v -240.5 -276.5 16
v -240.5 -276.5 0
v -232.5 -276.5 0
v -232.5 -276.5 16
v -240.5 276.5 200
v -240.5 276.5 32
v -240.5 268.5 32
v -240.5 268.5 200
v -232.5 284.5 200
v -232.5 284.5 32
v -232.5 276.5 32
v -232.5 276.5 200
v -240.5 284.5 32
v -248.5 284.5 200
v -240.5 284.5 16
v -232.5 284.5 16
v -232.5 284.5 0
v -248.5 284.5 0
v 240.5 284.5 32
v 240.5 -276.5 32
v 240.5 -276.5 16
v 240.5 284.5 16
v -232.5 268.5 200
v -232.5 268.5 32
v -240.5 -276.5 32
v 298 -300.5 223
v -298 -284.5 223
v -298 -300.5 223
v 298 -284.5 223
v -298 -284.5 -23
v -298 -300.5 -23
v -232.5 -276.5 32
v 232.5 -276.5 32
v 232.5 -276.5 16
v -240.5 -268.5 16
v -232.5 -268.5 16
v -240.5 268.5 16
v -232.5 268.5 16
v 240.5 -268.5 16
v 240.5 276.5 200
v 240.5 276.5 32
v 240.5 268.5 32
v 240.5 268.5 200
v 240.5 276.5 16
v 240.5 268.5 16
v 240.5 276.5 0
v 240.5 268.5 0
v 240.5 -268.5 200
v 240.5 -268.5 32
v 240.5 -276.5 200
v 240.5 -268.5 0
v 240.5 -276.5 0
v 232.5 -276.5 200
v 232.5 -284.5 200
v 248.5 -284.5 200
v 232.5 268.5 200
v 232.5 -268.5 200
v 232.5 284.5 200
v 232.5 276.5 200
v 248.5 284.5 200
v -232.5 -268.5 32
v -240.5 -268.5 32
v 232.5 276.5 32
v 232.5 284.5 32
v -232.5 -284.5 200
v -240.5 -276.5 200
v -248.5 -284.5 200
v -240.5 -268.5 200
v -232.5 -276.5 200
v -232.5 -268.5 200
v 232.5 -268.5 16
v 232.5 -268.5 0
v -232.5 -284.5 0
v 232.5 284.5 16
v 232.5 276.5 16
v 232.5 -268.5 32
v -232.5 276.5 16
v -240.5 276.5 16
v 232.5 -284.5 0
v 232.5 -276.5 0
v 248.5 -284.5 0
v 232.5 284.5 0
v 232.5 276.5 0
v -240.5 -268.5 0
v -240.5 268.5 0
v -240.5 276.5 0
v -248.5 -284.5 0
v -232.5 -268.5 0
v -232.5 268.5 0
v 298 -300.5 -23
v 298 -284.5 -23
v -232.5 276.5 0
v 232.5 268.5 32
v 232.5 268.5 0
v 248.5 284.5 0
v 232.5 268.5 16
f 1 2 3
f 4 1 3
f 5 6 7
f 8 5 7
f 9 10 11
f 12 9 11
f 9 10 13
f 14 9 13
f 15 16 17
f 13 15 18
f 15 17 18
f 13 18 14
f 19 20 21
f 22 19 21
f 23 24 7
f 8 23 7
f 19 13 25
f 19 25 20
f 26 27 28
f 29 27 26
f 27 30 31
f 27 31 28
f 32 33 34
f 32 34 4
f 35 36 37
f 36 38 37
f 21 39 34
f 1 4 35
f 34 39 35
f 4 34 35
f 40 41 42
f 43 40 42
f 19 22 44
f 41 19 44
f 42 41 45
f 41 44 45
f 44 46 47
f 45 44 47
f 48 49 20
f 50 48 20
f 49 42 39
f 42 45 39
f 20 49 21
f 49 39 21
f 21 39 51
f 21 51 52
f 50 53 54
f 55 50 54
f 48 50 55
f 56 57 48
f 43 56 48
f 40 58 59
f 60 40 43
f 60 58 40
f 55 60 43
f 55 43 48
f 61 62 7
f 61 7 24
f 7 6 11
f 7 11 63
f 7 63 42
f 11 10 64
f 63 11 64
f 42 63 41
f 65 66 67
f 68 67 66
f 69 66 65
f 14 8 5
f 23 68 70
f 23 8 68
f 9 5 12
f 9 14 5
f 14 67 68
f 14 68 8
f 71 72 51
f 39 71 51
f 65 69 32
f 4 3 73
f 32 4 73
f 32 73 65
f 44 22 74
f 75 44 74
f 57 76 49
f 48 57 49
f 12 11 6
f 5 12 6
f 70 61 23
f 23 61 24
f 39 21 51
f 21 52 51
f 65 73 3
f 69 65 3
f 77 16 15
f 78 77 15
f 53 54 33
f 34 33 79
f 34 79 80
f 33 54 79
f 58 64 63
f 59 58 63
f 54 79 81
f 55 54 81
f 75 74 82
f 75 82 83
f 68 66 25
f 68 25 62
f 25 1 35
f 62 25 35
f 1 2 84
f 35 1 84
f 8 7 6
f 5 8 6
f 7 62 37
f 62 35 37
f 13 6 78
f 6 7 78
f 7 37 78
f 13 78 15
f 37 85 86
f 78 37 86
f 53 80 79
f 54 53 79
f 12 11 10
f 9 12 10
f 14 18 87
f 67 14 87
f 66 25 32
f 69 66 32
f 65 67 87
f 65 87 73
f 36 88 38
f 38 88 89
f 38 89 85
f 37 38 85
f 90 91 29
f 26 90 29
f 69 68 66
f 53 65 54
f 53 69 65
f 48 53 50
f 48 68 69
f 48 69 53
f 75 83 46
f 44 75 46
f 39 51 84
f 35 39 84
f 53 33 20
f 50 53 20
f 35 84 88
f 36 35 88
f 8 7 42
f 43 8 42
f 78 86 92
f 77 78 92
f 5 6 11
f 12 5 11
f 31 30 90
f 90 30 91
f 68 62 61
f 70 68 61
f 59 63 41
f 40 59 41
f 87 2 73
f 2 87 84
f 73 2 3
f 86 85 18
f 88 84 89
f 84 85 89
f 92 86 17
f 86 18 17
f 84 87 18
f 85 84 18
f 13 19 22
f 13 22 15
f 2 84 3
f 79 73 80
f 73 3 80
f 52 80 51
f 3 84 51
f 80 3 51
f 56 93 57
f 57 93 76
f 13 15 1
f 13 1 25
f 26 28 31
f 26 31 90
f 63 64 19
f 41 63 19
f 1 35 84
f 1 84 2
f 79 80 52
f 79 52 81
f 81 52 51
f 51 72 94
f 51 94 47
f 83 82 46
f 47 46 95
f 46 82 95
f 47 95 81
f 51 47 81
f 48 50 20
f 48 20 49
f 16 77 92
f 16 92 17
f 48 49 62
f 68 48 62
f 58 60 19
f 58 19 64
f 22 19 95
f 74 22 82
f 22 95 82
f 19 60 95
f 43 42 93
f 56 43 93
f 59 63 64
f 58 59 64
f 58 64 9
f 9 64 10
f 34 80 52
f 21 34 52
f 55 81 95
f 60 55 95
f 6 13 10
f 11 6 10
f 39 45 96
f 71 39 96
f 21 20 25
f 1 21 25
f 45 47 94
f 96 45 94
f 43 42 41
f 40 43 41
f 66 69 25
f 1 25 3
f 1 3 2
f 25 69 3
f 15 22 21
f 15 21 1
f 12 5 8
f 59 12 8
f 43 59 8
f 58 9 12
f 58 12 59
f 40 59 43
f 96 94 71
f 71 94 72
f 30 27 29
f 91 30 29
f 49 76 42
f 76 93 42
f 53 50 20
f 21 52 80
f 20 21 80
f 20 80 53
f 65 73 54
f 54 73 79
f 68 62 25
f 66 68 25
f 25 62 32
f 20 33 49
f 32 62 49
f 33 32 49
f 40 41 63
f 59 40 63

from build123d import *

# Parameters (mm, degrees)
F1_DEPTH  = 200
F2_DEPTH  = 200
F3_DEPTH  = 200
F4_DEPTH  = 200
F5_DEPTH  = 32
F7_DEPTH  = 561
F9_DEPTH  = 561
F10_W     = 596
F10_H     = 246
F10_W_2   = 465.0000002384
F10_H_2   = 200
F10_W_3   = 16
F10_W_4   = 15.9999997616
F11_DEPTH = 16


with BuildPart() as f1:
    # F0 (on Top) → F1 (new body)
    with BuildSketch(Plane.XY):
        Polygon((-248.5, -284.5), (-232.5000002384, -284.5), (-232.5000002384, -276.5000002384), (-240.5000002384, -276.5000002384), (-240.5000002384, -268.5000002384), (-232.5000002384, -268.5000002384), (-232.5000002384, 268.5000002384), (-240.5000002384, 268.5000002384), (-240.5000002384, 276.5000002384), (-232.5000002384, 276.5000002384), (-232.5000002384, 284.5), (-248.5, 284.5), align=None)
    extrude(amount=F1_DEPTH)


with BuildPart() as f2:
    # F0 (on Top) → F2 (new body)
    with BuildSketch(Plane.XY):
        Polygon((232.5, -284.5), (248.5, -284.5), (248.5, 284.5), (232.5, 284.5), (232.5, 276.5000002384), (240.5, 276.5000002384), (240.5, 268.5000002384), (232.5, 268.5000002384), (232.5, -268.5000002384), (240.5, -268.5000002384), (240.5, -276.5000002384), (232.5, -276.5000002384), align=None)
    extrude(amount=F2_DEPTH)


with BuildPart() as f3:
    # F0 (on Top) → F3 (new body)
    with BuildSketch(Plane.XY):
        Polygon((232.5, 276.5000002384), (232.5, 284.5), (-232.5000002384, 284.5), (-232.5000002384, 276.5000002384), (-240.5000002384, 276.5000002384), (-240.5000002384, 268.5000002384), (-232.5000002384, 268.5000002384), (232.5, 268.5000002384), (240.5, 268.5000002384), (240.5, 276.5000002384), align=None)
    extrude(amount=F3_DEPTH)

    # F0 (on Top) → F5 (cut)
    with BuildSketch(Plane.XY):
        Polygon((232.5, 276.5000002384), (232.5, 284.5), (-232.5000002384, 284.5), (-232.5000002384, 276.5000002384), (-240.5000002384, 276.5000002384), (-240.5000002384, 268.5000002384), (-232.5000002384, 268.5000002384), (232.5, 268.5000002384), (240.5, 268.5000002384), (240.5, 276.5000002384), align=None)
    extrude(amount=F5_DEPTH, mode=Mode.SUBTRACT)


with BuildPart() as f4:
    # F0 (on Top) → F4 (new body)
    with BuildSketch(Plane.XY):
        Polygon((-232.5000002384, -284.5), (232.5, -284.5), (232.5, -276.5000002384), (240.5, -276.5000002384), (240.5, -268.5000002384), (232.5, -268.5000002384), (-232.5000002384, -268.5000002384), (-240.5000002384, -268.5000002384), (-240.5000002384, -276.5000002384), (-232.5000002384, -276.5000002384), align=None)
    extrude(amount=F4_DEPTH)


with BuildPart() as f7:
    # F6 (on face) → F7 (new body)
    with BuildSketch(Plane(origin=(0, 284.5, 0), x_dir=(-1, 0, 0), z_dir=(0, 1, 0))):
        Polygon((-232.5, 32), (-240.5, 32), (-240.5, 16), (240.5000002384, 16), (240.5000002384, 32), (232.5000002384, 32), align=None)
    extrude(amount=-F7_DEPTH)


with BuildPart() as f2_1:
    add(f2.part)

    # F8: cut F7
    add(f7.part, mode=Mode.SUBTRACT)


with BuildPart() as f1_1:
    add(f1.part)

    # F8: cut F7
    add(f7.part, mode=Mode.SUBTRACT)


with BuildPart() as f4_1:
    add(f4.part)

    # F8: cut F7
    add(f7.part, mode=Mode.SUBTRACT)


with BuildPart() as f9:
    # F6 (on face) → F9 (new body)
    with BuildSketch(Plane(origin=(0, 284.5, 0), x_dir=(-1, 0, 0), z_dir=(0, 1, 0))):
        Polygon((-232.5, 32), (-240.5, 32), (-240.5, 16), (240.5000002384, 16), (240.5000002384, 32), (232.5000002384, 32), align=None)
    extrude(amount=-F9_DEPTH)


with BuildPart() as f11:
    # F10 (on face) → F11 (new body)
    with BuildSketch(Plane.XZ.offset(284.5)):
        with Locations((0, 100)):
            Rectangle(F10_W, F10_H)
        Polygon((-248.5, 0), (-248.5, 200), (-232.5000002384, 200), (232.5, 200), (248.5, 200), (248.5, 0), (232.5, 0), (-232.5000002384, 0), align=None, mode=Mode.SUBTRACT)
        with Locations((-1.192e-07, 100)):
            Rectangle(F10_W_2, F10_H_2)
        with Locations((240.5, 100)):
            Rectangle(F10_W_3, F10_H_2)
        with Locations((-240.5000001192, 100)):
            Rectangle(F10_W_4, F10_H_2)
    extrude(amount=F11_DEPTH)


solid = Compound([f3.part, f2_1.part, f1_1.part, f4_1.part, f9.part, f11.part])
